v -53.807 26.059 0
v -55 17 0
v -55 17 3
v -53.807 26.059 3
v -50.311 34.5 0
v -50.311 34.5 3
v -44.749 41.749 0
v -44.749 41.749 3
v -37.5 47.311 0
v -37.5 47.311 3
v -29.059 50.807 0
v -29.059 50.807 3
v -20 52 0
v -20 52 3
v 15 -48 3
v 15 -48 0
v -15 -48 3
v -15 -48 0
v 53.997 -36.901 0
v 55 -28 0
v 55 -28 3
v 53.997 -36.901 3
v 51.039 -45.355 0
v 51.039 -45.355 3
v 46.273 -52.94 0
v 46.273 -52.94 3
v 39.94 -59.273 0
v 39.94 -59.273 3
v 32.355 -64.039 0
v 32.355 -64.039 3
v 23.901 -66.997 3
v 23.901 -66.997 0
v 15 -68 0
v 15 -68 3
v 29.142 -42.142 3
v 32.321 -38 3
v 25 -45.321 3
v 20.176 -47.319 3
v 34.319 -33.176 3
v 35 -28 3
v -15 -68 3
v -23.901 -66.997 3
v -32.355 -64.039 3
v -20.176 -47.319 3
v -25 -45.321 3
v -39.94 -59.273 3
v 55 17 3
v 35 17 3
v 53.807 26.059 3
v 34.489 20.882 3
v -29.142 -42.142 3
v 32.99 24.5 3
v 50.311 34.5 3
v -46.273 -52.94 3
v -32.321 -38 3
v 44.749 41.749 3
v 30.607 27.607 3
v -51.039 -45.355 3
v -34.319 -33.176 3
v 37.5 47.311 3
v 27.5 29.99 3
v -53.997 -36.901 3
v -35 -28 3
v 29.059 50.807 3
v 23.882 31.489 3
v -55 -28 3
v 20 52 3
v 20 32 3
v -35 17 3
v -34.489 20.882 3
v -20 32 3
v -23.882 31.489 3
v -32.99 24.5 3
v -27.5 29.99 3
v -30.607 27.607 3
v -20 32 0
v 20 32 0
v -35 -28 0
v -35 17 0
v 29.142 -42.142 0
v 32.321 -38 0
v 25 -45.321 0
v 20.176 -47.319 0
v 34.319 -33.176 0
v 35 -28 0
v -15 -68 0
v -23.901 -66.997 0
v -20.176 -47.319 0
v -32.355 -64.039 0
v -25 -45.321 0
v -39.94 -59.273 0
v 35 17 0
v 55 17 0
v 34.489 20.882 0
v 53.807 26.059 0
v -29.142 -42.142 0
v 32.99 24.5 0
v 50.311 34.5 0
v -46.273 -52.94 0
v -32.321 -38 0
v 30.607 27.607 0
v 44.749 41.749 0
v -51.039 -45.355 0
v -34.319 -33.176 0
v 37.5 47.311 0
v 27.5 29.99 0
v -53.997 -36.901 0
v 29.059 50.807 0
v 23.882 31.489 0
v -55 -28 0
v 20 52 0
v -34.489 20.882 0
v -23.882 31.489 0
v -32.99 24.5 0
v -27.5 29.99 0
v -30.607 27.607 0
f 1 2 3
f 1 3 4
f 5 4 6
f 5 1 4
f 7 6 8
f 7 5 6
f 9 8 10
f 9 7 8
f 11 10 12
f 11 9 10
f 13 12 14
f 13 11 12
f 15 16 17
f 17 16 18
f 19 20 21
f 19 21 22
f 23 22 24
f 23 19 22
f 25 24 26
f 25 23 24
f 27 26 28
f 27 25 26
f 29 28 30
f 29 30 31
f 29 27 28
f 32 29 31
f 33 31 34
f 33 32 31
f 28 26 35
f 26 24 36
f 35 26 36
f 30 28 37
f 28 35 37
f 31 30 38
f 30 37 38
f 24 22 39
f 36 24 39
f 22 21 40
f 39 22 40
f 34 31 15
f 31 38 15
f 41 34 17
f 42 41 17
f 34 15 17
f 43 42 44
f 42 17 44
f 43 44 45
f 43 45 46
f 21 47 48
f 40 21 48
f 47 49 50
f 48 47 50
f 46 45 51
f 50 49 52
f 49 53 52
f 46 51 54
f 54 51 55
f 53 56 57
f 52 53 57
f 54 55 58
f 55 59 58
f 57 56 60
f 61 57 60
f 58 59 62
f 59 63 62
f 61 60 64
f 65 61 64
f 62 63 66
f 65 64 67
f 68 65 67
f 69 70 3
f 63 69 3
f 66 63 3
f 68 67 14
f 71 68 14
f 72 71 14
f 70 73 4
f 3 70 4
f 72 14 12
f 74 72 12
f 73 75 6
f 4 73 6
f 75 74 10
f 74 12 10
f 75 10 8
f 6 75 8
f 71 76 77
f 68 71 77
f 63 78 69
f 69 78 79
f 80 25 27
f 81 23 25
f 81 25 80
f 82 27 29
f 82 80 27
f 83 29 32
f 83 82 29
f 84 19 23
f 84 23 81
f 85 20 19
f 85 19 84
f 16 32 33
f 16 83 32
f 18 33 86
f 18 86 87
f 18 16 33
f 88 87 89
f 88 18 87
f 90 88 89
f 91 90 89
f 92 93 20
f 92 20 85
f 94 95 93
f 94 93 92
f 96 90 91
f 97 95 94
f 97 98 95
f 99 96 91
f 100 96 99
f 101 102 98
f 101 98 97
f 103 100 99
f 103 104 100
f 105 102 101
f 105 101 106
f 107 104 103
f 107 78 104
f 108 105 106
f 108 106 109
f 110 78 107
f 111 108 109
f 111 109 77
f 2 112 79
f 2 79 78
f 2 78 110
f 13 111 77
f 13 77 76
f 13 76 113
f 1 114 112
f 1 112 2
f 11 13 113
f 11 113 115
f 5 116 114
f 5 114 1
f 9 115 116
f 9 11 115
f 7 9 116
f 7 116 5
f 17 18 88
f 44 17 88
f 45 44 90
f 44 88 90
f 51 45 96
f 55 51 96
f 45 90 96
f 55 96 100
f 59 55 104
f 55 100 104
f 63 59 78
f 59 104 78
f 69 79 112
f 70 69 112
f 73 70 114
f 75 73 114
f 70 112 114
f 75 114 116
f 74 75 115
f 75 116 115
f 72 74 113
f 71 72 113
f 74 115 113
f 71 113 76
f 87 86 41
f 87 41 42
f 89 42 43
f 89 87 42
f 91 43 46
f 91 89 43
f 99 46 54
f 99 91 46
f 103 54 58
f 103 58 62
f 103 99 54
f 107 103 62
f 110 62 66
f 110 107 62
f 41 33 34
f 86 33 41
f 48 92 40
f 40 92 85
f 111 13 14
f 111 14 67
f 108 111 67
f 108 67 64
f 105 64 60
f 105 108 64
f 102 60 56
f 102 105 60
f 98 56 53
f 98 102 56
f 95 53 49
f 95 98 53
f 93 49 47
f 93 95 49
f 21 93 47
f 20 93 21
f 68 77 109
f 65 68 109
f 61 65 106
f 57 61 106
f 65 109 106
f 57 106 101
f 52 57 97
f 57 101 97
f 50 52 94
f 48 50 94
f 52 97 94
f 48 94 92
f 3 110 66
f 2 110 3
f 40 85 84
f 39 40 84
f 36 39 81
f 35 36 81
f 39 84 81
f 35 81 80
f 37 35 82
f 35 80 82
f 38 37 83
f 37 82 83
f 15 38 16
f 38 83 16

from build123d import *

# Parameters (mm, degrees)
BOSS_EXTRUDE1_DEPTH = 3


with BuildPart() as part:
    # Sketch1 → Boss-Extrude1 (new body)
    with BuildSketch(Plane.XY):
        with BuildLine():
            Line((-20, 52), (20, 52))
            ThreePointArc((20, 52), (44.748737342, 41.748737342), (55, 17))
            Line((55, 17), (55, -28))
            ThreePointArc((55, -28), (43.284271247, -56.284271247), (15, -68))
            Line((15, -68), (0.5, -68))
            Line((0.5, -68), (-0.5, -68))
            Line((-0.5, -68), (-15, -68))
            ThreePointArc((-15, -68), (-43.284271247, -56.284271247), (-55, -28))
            Line((-55, -28), (-55, 17))
            ThreePointArc((-55, 17), (-44.748737342, 41.748737342), (-20, 52))
        make_face()
        with BuildLine():
            Line((-20, 32), (20, 32))
            ThreePointArc((20, 32), (30.606601718, 27.606601718), (35, 17))
            Line((35, 17), (35, -28))
            ThreePointArc((35, -28), (29.142135624, -42.142135624), (15, -48))
            Line((15, -48), (0.5, -48))
            Line((0.5, -48), (-0.5, -48))
            Line((-0.5, -48), (-15, -48))
            ThreePointArc((-15, -48), (-29.142135624, -42.142135624), (-35, -28))
            Line((-35, -28), (-35, 17))
            ThreePointArc((-35, 17), (-30.606601718, 27.606601718), (-20, 32))
        make_face(mode=Mode.SUBTRACT)
    extrude(amount=BOSS_EXTRUDE1_DEPTH)


solid = part.part
